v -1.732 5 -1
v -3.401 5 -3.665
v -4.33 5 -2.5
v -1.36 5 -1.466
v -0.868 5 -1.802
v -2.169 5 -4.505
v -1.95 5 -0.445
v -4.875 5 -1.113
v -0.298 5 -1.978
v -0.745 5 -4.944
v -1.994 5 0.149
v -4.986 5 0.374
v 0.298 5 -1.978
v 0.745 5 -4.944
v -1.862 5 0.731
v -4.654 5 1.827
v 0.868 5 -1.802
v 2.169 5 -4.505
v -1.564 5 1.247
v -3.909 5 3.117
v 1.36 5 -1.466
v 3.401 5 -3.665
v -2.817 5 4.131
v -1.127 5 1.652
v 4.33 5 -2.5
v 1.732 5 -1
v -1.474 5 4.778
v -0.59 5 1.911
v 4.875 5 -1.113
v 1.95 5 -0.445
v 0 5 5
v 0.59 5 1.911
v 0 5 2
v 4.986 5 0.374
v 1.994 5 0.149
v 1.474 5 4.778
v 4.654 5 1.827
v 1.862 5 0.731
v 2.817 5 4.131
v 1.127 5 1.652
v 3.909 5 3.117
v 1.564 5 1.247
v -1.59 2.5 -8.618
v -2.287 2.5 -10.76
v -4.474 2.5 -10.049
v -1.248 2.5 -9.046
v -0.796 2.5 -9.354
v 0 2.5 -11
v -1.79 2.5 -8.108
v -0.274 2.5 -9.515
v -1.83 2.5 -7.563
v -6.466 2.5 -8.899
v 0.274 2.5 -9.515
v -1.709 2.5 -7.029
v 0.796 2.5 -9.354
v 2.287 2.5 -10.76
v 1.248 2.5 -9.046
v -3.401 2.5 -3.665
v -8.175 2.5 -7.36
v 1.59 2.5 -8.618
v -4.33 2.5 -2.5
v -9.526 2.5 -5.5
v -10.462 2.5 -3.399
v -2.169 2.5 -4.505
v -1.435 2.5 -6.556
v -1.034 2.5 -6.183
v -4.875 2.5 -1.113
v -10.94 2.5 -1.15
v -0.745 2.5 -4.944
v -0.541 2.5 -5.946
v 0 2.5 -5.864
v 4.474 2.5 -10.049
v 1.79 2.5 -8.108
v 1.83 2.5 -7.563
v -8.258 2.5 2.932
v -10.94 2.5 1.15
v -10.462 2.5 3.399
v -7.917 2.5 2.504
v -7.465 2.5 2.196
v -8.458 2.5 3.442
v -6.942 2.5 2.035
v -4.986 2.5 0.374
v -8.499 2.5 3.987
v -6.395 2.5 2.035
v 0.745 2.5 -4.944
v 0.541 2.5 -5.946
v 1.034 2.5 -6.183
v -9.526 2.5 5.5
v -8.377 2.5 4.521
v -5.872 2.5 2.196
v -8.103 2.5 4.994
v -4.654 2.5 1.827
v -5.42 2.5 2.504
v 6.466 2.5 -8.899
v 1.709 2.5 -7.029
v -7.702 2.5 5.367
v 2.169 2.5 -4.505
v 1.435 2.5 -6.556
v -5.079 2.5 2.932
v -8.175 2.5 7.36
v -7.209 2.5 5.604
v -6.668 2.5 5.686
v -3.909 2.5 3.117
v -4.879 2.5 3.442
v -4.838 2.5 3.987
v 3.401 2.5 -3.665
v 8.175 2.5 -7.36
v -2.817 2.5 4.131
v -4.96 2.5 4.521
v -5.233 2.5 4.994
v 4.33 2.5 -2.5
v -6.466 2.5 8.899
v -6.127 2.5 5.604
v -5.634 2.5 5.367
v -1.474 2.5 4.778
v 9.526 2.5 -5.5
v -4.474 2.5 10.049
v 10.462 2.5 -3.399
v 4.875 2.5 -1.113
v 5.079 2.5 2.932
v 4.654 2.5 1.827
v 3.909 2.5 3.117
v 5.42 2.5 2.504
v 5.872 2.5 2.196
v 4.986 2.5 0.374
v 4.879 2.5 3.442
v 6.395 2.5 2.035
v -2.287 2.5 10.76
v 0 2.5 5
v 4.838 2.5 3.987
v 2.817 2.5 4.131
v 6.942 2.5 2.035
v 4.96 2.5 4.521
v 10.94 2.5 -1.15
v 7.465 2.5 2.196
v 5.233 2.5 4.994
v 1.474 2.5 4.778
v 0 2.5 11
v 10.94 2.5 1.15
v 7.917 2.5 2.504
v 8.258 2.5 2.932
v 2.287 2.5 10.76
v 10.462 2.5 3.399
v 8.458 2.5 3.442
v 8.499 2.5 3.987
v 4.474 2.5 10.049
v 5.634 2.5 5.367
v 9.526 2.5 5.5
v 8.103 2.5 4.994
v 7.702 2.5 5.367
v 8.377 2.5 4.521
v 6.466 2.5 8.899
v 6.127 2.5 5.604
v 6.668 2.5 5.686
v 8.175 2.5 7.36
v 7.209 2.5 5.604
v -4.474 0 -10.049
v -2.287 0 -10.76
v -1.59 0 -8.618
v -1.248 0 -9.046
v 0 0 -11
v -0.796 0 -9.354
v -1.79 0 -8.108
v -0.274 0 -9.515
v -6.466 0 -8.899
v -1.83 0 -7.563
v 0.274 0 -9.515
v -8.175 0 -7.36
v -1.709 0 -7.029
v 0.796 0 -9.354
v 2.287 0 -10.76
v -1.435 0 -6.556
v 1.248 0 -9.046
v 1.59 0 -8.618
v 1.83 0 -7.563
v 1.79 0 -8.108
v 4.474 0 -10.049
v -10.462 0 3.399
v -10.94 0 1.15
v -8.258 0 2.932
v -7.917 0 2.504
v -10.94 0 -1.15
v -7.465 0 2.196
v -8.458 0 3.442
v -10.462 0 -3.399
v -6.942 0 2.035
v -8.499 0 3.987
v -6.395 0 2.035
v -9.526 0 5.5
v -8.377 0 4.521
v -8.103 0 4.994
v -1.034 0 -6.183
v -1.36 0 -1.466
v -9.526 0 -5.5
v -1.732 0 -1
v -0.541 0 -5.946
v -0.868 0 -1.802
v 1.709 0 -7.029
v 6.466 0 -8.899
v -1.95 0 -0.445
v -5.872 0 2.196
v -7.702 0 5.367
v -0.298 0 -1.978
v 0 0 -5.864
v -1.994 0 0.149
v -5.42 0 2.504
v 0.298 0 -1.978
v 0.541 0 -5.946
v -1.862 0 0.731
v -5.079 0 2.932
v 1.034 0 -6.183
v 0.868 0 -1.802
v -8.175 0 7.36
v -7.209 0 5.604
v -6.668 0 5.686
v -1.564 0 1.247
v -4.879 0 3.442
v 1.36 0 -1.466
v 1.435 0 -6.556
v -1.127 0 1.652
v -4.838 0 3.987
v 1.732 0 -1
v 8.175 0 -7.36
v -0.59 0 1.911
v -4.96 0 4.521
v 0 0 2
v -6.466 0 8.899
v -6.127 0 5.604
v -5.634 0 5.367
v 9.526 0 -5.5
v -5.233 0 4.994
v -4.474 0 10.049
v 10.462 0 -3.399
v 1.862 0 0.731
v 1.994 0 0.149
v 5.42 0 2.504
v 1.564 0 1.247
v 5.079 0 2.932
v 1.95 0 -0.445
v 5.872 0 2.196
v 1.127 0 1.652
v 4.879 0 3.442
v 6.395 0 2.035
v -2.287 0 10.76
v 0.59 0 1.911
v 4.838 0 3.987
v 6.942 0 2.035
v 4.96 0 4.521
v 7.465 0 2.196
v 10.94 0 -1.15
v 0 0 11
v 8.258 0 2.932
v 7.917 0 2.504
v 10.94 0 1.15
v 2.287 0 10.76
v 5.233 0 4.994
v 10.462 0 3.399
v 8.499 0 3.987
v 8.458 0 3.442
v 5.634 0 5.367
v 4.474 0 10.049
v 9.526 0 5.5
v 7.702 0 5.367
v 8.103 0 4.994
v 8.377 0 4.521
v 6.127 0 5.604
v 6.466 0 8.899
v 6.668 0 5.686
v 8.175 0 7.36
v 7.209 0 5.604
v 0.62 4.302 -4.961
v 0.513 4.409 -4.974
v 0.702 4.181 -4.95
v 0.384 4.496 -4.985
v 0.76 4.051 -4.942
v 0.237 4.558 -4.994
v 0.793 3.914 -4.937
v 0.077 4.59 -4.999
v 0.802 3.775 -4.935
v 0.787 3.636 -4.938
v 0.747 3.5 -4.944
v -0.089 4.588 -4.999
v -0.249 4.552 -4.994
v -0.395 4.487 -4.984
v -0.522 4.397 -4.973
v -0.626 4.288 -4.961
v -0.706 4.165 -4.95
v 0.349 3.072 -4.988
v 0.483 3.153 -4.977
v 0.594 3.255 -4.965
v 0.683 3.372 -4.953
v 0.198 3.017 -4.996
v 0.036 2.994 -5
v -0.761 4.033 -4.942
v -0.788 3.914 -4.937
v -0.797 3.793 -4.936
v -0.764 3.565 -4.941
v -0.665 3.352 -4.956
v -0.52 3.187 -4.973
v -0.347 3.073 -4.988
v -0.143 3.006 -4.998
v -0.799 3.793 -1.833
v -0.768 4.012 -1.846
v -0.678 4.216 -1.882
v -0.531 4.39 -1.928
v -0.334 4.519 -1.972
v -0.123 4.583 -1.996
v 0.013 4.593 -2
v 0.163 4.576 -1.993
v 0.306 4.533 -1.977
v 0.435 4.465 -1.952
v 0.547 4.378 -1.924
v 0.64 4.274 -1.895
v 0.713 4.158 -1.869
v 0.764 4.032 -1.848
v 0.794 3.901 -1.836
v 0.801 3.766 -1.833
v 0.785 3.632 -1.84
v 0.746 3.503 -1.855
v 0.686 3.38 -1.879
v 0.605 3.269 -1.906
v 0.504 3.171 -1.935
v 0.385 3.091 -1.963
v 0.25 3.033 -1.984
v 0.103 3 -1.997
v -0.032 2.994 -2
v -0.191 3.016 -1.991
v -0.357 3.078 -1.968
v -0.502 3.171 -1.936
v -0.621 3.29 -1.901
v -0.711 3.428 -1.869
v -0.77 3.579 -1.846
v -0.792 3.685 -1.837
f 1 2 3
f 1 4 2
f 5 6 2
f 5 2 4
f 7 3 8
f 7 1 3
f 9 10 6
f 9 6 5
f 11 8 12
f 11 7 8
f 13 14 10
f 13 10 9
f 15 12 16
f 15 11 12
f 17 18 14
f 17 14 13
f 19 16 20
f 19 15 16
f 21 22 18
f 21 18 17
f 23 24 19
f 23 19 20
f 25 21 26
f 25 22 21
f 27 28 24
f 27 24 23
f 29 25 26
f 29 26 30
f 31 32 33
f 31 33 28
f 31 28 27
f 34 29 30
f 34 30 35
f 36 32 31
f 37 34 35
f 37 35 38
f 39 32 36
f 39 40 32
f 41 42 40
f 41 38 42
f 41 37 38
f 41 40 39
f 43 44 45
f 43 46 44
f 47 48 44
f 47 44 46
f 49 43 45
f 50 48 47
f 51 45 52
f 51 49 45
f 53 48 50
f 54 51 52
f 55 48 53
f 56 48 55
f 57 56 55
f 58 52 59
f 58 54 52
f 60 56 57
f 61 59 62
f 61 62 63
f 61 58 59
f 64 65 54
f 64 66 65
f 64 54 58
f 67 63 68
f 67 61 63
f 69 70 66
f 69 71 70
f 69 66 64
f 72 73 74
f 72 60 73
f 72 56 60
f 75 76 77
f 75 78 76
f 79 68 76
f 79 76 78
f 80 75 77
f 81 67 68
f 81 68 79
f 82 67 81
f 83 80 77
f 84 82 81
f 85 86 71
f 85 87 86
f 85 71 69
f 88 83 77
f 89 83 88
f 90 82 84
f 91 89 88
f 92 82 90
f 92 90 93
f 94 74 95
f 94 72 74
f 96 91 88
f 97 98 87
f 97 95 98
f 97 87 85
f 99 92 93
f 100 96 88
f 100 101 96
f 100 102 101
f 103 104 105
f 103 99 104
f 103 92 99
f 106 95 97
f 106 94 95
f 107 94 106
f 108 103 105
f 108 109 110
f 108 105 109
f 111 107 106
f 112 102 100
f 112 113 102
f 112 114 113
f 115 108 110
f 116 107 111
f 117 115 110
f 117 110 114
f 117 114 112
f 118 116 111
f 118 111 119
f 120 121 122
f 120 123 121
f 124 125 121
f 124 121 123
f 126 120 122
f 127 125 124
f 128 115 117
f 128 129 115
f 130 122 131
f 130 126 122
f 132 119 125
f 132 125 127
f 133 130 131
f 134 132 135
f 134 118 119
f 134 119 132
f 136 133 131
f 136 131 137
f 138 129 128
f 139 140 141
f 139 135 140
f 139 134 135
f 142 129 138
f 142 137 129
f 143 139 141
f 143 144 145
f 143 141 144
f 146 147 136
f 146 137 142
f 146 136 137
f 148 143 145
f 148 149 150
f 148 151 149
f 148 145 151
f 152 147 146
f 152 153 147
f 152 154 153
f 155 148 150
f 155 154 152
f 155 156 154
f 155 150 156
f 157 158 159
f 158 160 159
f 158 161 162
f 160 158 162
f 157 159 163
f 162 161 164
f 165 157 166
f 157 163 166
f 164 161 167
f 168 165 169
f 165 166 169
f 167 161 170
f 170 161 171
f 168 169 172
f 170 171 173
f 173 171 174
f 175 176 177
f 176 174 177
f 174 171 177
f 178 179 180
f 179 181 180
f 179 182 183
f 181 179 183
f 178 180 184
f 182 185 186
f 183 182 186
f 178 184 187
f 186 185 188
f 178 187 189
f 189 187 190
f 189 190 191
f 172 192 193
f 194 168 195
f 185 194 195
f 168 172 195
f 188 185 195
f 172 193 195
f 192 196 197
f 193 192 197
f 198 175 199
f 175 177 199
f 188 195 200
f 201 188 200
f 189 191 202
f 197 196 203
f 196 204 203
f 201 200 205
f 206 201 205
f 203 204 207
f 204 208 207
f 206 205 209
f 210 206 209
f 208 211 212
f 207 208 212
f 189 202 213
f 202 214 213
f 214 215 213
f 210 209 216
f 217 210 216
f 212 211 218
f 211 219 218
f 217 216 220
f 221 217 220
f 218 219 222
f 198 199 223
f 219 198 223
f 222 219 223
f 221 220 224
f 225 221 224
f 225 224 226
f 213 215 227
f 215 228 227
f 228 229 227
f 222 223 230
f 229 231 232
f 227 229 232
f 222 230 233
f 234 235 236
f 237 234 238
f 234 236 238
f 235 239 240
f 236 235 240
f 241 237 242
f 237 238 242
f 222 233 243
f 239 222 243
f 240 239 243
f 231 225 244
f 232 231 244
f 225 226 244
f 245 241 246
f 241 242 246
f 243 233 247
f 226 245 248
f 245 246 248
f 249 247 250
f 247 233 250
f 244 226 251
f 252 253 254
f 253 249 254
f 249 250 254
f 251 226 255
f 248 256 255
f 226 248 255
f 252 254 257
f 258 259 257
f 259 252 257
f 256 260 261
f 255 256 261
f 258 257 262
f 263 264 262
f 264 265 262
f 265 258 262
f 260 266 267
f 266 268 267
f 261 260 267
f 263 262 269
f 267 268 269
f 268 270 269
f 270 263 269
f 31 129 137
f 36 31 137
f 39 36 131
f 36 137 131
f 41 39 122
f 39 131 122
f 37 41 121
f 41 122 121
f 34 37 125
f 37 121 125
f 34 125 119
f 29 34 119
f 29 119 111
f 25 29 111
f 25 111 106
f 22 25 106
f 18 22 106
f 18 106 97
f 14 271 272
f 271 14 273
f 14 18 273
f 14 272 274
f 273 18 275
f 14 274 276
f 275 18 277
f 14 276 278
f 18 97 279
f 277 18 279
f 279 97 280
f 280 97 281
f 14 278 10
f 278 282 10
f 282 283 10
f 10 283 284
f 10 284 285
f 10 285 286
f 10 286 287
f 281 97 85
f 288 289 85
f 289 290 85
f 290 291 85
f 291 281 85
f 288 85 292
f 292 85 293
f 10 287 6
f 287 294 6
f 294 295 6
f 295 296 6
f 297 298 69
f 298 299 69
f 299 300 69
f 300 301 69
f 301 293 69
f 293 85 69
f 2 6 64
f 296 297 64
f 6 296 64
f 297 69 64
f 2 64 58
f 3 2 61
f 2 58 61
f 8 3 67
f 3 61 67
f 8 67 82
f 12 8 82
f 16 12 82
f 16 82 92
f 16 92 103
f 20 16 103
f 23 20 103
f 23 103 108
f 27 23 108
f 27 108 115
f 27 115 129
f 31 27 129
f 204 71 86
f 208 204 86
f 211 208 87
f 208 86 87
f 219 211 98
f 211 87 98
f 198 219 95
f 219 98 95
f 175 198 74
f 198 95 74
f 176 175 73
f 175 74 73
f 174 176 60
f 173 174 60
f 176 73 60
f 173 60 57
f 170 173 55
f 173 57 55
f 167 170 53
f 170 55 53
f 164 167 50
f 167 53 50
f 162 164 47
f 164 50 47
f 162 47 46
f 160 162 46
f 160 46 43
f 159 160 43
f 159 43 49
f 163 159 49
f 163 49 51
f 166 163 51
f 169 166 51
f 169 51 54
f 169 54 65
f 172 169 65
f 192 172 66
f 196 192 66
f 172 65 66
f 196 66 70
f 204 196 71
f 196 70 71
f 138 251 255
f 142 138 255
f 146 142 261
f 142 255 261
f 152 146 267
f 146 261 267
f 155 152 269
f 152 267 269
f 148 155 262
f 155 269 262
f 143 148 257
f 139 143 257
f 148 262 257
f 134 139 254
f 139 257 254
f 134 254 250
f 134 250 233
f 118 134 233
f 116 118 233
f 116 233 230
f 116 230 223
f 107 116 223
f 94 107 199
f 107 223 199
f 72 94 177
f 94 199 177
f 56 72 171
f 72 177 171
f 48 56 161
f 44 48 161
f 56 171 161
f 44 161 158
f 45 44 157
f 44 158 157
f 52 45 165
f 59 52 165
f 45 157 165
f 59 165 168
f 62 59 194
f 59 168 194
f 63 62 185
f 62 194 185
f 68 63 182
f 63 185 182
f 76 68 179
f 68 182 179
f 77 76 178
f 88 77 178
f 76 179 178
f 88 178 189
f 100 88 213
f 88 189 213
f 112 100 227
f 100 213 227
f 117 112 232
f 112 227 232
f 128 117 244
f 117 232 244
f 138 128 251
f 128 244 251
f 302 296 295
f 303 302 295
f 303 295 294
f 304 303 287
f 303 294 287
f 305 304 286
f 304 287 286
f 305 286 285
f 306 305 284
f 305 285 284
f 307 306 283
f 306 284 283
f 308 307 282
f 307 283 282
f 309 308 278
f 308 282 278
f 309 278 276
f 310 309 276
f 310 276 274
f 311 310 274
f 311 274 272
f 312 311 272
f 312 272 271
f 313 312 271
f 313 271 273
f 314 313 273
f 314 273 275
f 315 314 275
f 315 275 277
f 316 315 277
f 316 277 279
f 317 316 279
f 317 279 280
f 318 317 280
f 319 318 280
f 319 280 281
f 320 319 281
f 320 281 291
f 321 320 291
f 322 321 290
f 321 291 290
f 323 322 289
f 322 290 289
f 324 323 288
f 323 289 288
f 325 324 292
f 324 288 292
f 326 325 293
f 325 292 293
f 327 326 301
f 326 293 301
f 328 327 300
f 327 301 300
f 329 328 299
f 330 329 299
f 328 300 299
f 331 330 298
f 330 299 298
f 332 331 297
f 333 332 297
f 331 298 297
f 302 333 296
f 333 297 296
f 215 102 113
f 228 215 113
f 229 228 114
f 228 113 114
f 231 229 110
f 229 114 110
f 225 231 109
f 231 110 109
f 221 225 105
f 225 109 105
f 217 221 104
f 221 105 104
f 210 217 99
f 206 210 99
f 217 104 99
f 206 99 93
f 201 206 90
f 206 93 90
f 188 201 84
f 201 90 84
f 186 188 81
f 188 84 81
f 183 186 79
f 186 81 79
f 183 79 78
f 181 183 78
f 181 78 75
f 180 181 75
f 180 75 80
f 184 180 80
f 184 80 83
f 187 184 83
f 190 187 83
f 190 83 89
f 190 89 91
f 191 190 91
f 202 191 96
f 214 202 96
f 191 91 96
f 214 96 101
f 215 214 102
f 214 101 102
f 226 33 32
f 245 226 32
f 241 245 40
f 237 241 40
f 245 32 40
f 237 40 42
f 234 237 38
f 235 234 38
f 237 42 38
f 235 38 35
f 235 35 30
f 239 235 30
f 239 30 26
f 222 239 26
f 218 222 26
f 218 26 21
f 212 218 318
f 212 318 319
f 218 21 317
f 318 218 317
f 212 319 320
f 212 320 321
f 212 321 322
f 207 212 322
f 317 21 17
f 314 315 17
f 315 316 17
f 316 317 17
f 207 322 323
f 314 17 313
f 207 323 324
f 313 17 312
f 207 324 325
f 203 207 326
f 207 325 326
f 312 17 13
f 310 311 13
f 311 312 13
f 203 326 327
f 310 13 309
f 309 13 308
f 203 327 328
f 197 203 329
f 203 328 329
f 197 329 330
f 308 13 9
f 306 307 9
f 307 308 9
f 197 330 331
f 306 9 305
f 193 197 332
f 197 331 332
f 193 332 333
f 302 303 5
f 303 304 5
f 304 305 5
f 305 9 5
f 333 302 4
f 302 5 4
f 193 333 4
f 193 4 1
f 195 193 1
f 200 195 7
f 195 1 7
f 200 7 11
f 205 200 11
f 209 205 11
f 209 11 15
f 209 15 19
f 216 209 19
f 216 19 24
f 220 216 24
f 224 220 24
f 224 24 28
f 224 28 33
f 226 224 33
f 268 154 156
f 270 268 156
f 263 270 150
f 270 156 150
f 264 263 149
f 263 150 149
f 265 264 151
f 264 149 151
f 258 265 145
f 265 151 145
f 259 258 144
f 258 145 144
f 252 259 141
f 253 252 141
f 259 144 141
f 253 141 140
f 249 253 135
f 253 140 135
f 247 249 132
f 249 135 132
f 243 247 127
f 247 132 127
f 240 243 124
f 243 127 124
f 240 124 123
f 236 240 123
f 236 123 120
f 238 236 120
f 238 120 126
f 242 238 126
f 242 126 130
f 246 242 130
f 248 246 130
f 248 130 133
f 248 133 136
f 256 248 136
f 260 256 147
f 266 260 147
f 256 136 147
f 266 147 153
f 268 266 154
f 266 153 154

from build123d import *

# Parameters (mm, degrees)
ESBO_O1_R                                      = 11
RESSALTO_EXTRUS_O1_DEPTH                       = 2.5
ESBO_O3_R                                      = 1.835521505
CORTE_EXTRUS_O1_DEPTH                          = 2.5
ESBO_O18_R                                     = 5
RESSALTO_EXTRUS_O5_DEPTH                       = 2.5
ESBO_O20_R                                     = 2
CORTE_EXTRUS_O5_DEPTH                          = 5.5
BROCA_DE_ROSQUEAR_PARA_TARRAXA_DE_M2X0_4_REACH = 21.785
BROCA_DE_ROSQUEAR_PARA_TARRAXA_DE_M2_2_R       = 0.8


with BuildPart() as part:
    # Esboço1 → Ressalto-extrusão1 (new body)
    with BuildSketch(Plane(origin=(0, 0, 0), x_dir=(1, 0, 0), z_dir=(0, 1, 0))):
        with Locations(Location((0, 0, 0), (0, 0, 270))):
            Circle(ESBO_O1_R)
    extrude(amount=RESSALTO_EXTRUS_O1_DEPTH)

    # Esboço3 → Corte-extrusão1 (cut)
    with BuildSketch(Plane(origin=(0, 2.5, 0), x_dir=(1, 0, 0), z_dir=(0, 1, 0))):
        with Locations(Location((0, 7.7, 0), (0, 0, 270))):
            Circle(ESBO_O3_R)
        with Locations(Location((6.668395609, -3.85, 0), (0, 0, 270))):
            Circle(ESBO_O3_R)
        with Locations(Location((-6.668395609, -3.85, 0), (0, 0, 270))):
            Circle(ESBO_O3_R)
    extrude(amount=-CORTE_EXTRUS_O1_DEPTH, mode=Mode.SUBTRACT)

    # Esboço18 → Ressalto-extrusão5 (add)
    with BuildSketch(Plane(origin=(0, 2.5, 0), x_dir=(1, 0, 0), z_dir=(0, 1, 0))):
        with Locations(Location((0, 0, 0), (0, 0, 270))):
            Circle(ESBO_O18_R)
    extrude(amount=RESSALTO_EXTRUS_O5_DEPTH)

    # Esboço20 → Corte-extrusão5 (cut)
    with BuildSketch(Plane(origin=(0, 5, 0), x_dir=(1, 0, 0), z_dir=(0, 1, 0))):
        with Locations(Location((0, 0, 0), (0, 0, 270))):
            Circle(ESBO_O20_R)
    extrude(amount=-CORTE_EXTRUS_O5_DEPTH, mode=Mode.SUBTRACT)

    # Broca de rosquear para tarraxa de M2 2 (on position points) → Broca de rosquear para tarraxa de M2x0.41 (cut, up to next)
    with BuildSketch(Plane(origin=(0.002598781, 3.792959438, -4.999999325), x_dir=(-0.999999864927, 0, -0.000519756122), z_dir=(0.000519756122, 0, -0.999999864927)), mode=Mode.PRIVATE) as broca_de_rosquear_para_tarraxa_de_m2x0_4_sk1:
        Circle(BROCA_DE_ROSQUEAR_PARA_TARRAXA_DE_M2_2_R)
    broca_de_rosquear_para_tarraxa_de_m2x0_4_tool1 = extrude(broca_de_rosquear_para_tarraxa_de_m2x0_4_sk1.sketch, amount=-BROCA_DE_ROSQUEAR_PARA_TARRAXA_DE_M2X0_4_REACH, mode=Mode.PRIVATE) & part.part
    add(broca_de_rosquear_para_tarraxa_de_m2x0_4_tool1.solids().sort_by_distance((0.002599, 3.792959, -4.999999))[0], mode=Mode.SUBTRACT)


solid = part.part
